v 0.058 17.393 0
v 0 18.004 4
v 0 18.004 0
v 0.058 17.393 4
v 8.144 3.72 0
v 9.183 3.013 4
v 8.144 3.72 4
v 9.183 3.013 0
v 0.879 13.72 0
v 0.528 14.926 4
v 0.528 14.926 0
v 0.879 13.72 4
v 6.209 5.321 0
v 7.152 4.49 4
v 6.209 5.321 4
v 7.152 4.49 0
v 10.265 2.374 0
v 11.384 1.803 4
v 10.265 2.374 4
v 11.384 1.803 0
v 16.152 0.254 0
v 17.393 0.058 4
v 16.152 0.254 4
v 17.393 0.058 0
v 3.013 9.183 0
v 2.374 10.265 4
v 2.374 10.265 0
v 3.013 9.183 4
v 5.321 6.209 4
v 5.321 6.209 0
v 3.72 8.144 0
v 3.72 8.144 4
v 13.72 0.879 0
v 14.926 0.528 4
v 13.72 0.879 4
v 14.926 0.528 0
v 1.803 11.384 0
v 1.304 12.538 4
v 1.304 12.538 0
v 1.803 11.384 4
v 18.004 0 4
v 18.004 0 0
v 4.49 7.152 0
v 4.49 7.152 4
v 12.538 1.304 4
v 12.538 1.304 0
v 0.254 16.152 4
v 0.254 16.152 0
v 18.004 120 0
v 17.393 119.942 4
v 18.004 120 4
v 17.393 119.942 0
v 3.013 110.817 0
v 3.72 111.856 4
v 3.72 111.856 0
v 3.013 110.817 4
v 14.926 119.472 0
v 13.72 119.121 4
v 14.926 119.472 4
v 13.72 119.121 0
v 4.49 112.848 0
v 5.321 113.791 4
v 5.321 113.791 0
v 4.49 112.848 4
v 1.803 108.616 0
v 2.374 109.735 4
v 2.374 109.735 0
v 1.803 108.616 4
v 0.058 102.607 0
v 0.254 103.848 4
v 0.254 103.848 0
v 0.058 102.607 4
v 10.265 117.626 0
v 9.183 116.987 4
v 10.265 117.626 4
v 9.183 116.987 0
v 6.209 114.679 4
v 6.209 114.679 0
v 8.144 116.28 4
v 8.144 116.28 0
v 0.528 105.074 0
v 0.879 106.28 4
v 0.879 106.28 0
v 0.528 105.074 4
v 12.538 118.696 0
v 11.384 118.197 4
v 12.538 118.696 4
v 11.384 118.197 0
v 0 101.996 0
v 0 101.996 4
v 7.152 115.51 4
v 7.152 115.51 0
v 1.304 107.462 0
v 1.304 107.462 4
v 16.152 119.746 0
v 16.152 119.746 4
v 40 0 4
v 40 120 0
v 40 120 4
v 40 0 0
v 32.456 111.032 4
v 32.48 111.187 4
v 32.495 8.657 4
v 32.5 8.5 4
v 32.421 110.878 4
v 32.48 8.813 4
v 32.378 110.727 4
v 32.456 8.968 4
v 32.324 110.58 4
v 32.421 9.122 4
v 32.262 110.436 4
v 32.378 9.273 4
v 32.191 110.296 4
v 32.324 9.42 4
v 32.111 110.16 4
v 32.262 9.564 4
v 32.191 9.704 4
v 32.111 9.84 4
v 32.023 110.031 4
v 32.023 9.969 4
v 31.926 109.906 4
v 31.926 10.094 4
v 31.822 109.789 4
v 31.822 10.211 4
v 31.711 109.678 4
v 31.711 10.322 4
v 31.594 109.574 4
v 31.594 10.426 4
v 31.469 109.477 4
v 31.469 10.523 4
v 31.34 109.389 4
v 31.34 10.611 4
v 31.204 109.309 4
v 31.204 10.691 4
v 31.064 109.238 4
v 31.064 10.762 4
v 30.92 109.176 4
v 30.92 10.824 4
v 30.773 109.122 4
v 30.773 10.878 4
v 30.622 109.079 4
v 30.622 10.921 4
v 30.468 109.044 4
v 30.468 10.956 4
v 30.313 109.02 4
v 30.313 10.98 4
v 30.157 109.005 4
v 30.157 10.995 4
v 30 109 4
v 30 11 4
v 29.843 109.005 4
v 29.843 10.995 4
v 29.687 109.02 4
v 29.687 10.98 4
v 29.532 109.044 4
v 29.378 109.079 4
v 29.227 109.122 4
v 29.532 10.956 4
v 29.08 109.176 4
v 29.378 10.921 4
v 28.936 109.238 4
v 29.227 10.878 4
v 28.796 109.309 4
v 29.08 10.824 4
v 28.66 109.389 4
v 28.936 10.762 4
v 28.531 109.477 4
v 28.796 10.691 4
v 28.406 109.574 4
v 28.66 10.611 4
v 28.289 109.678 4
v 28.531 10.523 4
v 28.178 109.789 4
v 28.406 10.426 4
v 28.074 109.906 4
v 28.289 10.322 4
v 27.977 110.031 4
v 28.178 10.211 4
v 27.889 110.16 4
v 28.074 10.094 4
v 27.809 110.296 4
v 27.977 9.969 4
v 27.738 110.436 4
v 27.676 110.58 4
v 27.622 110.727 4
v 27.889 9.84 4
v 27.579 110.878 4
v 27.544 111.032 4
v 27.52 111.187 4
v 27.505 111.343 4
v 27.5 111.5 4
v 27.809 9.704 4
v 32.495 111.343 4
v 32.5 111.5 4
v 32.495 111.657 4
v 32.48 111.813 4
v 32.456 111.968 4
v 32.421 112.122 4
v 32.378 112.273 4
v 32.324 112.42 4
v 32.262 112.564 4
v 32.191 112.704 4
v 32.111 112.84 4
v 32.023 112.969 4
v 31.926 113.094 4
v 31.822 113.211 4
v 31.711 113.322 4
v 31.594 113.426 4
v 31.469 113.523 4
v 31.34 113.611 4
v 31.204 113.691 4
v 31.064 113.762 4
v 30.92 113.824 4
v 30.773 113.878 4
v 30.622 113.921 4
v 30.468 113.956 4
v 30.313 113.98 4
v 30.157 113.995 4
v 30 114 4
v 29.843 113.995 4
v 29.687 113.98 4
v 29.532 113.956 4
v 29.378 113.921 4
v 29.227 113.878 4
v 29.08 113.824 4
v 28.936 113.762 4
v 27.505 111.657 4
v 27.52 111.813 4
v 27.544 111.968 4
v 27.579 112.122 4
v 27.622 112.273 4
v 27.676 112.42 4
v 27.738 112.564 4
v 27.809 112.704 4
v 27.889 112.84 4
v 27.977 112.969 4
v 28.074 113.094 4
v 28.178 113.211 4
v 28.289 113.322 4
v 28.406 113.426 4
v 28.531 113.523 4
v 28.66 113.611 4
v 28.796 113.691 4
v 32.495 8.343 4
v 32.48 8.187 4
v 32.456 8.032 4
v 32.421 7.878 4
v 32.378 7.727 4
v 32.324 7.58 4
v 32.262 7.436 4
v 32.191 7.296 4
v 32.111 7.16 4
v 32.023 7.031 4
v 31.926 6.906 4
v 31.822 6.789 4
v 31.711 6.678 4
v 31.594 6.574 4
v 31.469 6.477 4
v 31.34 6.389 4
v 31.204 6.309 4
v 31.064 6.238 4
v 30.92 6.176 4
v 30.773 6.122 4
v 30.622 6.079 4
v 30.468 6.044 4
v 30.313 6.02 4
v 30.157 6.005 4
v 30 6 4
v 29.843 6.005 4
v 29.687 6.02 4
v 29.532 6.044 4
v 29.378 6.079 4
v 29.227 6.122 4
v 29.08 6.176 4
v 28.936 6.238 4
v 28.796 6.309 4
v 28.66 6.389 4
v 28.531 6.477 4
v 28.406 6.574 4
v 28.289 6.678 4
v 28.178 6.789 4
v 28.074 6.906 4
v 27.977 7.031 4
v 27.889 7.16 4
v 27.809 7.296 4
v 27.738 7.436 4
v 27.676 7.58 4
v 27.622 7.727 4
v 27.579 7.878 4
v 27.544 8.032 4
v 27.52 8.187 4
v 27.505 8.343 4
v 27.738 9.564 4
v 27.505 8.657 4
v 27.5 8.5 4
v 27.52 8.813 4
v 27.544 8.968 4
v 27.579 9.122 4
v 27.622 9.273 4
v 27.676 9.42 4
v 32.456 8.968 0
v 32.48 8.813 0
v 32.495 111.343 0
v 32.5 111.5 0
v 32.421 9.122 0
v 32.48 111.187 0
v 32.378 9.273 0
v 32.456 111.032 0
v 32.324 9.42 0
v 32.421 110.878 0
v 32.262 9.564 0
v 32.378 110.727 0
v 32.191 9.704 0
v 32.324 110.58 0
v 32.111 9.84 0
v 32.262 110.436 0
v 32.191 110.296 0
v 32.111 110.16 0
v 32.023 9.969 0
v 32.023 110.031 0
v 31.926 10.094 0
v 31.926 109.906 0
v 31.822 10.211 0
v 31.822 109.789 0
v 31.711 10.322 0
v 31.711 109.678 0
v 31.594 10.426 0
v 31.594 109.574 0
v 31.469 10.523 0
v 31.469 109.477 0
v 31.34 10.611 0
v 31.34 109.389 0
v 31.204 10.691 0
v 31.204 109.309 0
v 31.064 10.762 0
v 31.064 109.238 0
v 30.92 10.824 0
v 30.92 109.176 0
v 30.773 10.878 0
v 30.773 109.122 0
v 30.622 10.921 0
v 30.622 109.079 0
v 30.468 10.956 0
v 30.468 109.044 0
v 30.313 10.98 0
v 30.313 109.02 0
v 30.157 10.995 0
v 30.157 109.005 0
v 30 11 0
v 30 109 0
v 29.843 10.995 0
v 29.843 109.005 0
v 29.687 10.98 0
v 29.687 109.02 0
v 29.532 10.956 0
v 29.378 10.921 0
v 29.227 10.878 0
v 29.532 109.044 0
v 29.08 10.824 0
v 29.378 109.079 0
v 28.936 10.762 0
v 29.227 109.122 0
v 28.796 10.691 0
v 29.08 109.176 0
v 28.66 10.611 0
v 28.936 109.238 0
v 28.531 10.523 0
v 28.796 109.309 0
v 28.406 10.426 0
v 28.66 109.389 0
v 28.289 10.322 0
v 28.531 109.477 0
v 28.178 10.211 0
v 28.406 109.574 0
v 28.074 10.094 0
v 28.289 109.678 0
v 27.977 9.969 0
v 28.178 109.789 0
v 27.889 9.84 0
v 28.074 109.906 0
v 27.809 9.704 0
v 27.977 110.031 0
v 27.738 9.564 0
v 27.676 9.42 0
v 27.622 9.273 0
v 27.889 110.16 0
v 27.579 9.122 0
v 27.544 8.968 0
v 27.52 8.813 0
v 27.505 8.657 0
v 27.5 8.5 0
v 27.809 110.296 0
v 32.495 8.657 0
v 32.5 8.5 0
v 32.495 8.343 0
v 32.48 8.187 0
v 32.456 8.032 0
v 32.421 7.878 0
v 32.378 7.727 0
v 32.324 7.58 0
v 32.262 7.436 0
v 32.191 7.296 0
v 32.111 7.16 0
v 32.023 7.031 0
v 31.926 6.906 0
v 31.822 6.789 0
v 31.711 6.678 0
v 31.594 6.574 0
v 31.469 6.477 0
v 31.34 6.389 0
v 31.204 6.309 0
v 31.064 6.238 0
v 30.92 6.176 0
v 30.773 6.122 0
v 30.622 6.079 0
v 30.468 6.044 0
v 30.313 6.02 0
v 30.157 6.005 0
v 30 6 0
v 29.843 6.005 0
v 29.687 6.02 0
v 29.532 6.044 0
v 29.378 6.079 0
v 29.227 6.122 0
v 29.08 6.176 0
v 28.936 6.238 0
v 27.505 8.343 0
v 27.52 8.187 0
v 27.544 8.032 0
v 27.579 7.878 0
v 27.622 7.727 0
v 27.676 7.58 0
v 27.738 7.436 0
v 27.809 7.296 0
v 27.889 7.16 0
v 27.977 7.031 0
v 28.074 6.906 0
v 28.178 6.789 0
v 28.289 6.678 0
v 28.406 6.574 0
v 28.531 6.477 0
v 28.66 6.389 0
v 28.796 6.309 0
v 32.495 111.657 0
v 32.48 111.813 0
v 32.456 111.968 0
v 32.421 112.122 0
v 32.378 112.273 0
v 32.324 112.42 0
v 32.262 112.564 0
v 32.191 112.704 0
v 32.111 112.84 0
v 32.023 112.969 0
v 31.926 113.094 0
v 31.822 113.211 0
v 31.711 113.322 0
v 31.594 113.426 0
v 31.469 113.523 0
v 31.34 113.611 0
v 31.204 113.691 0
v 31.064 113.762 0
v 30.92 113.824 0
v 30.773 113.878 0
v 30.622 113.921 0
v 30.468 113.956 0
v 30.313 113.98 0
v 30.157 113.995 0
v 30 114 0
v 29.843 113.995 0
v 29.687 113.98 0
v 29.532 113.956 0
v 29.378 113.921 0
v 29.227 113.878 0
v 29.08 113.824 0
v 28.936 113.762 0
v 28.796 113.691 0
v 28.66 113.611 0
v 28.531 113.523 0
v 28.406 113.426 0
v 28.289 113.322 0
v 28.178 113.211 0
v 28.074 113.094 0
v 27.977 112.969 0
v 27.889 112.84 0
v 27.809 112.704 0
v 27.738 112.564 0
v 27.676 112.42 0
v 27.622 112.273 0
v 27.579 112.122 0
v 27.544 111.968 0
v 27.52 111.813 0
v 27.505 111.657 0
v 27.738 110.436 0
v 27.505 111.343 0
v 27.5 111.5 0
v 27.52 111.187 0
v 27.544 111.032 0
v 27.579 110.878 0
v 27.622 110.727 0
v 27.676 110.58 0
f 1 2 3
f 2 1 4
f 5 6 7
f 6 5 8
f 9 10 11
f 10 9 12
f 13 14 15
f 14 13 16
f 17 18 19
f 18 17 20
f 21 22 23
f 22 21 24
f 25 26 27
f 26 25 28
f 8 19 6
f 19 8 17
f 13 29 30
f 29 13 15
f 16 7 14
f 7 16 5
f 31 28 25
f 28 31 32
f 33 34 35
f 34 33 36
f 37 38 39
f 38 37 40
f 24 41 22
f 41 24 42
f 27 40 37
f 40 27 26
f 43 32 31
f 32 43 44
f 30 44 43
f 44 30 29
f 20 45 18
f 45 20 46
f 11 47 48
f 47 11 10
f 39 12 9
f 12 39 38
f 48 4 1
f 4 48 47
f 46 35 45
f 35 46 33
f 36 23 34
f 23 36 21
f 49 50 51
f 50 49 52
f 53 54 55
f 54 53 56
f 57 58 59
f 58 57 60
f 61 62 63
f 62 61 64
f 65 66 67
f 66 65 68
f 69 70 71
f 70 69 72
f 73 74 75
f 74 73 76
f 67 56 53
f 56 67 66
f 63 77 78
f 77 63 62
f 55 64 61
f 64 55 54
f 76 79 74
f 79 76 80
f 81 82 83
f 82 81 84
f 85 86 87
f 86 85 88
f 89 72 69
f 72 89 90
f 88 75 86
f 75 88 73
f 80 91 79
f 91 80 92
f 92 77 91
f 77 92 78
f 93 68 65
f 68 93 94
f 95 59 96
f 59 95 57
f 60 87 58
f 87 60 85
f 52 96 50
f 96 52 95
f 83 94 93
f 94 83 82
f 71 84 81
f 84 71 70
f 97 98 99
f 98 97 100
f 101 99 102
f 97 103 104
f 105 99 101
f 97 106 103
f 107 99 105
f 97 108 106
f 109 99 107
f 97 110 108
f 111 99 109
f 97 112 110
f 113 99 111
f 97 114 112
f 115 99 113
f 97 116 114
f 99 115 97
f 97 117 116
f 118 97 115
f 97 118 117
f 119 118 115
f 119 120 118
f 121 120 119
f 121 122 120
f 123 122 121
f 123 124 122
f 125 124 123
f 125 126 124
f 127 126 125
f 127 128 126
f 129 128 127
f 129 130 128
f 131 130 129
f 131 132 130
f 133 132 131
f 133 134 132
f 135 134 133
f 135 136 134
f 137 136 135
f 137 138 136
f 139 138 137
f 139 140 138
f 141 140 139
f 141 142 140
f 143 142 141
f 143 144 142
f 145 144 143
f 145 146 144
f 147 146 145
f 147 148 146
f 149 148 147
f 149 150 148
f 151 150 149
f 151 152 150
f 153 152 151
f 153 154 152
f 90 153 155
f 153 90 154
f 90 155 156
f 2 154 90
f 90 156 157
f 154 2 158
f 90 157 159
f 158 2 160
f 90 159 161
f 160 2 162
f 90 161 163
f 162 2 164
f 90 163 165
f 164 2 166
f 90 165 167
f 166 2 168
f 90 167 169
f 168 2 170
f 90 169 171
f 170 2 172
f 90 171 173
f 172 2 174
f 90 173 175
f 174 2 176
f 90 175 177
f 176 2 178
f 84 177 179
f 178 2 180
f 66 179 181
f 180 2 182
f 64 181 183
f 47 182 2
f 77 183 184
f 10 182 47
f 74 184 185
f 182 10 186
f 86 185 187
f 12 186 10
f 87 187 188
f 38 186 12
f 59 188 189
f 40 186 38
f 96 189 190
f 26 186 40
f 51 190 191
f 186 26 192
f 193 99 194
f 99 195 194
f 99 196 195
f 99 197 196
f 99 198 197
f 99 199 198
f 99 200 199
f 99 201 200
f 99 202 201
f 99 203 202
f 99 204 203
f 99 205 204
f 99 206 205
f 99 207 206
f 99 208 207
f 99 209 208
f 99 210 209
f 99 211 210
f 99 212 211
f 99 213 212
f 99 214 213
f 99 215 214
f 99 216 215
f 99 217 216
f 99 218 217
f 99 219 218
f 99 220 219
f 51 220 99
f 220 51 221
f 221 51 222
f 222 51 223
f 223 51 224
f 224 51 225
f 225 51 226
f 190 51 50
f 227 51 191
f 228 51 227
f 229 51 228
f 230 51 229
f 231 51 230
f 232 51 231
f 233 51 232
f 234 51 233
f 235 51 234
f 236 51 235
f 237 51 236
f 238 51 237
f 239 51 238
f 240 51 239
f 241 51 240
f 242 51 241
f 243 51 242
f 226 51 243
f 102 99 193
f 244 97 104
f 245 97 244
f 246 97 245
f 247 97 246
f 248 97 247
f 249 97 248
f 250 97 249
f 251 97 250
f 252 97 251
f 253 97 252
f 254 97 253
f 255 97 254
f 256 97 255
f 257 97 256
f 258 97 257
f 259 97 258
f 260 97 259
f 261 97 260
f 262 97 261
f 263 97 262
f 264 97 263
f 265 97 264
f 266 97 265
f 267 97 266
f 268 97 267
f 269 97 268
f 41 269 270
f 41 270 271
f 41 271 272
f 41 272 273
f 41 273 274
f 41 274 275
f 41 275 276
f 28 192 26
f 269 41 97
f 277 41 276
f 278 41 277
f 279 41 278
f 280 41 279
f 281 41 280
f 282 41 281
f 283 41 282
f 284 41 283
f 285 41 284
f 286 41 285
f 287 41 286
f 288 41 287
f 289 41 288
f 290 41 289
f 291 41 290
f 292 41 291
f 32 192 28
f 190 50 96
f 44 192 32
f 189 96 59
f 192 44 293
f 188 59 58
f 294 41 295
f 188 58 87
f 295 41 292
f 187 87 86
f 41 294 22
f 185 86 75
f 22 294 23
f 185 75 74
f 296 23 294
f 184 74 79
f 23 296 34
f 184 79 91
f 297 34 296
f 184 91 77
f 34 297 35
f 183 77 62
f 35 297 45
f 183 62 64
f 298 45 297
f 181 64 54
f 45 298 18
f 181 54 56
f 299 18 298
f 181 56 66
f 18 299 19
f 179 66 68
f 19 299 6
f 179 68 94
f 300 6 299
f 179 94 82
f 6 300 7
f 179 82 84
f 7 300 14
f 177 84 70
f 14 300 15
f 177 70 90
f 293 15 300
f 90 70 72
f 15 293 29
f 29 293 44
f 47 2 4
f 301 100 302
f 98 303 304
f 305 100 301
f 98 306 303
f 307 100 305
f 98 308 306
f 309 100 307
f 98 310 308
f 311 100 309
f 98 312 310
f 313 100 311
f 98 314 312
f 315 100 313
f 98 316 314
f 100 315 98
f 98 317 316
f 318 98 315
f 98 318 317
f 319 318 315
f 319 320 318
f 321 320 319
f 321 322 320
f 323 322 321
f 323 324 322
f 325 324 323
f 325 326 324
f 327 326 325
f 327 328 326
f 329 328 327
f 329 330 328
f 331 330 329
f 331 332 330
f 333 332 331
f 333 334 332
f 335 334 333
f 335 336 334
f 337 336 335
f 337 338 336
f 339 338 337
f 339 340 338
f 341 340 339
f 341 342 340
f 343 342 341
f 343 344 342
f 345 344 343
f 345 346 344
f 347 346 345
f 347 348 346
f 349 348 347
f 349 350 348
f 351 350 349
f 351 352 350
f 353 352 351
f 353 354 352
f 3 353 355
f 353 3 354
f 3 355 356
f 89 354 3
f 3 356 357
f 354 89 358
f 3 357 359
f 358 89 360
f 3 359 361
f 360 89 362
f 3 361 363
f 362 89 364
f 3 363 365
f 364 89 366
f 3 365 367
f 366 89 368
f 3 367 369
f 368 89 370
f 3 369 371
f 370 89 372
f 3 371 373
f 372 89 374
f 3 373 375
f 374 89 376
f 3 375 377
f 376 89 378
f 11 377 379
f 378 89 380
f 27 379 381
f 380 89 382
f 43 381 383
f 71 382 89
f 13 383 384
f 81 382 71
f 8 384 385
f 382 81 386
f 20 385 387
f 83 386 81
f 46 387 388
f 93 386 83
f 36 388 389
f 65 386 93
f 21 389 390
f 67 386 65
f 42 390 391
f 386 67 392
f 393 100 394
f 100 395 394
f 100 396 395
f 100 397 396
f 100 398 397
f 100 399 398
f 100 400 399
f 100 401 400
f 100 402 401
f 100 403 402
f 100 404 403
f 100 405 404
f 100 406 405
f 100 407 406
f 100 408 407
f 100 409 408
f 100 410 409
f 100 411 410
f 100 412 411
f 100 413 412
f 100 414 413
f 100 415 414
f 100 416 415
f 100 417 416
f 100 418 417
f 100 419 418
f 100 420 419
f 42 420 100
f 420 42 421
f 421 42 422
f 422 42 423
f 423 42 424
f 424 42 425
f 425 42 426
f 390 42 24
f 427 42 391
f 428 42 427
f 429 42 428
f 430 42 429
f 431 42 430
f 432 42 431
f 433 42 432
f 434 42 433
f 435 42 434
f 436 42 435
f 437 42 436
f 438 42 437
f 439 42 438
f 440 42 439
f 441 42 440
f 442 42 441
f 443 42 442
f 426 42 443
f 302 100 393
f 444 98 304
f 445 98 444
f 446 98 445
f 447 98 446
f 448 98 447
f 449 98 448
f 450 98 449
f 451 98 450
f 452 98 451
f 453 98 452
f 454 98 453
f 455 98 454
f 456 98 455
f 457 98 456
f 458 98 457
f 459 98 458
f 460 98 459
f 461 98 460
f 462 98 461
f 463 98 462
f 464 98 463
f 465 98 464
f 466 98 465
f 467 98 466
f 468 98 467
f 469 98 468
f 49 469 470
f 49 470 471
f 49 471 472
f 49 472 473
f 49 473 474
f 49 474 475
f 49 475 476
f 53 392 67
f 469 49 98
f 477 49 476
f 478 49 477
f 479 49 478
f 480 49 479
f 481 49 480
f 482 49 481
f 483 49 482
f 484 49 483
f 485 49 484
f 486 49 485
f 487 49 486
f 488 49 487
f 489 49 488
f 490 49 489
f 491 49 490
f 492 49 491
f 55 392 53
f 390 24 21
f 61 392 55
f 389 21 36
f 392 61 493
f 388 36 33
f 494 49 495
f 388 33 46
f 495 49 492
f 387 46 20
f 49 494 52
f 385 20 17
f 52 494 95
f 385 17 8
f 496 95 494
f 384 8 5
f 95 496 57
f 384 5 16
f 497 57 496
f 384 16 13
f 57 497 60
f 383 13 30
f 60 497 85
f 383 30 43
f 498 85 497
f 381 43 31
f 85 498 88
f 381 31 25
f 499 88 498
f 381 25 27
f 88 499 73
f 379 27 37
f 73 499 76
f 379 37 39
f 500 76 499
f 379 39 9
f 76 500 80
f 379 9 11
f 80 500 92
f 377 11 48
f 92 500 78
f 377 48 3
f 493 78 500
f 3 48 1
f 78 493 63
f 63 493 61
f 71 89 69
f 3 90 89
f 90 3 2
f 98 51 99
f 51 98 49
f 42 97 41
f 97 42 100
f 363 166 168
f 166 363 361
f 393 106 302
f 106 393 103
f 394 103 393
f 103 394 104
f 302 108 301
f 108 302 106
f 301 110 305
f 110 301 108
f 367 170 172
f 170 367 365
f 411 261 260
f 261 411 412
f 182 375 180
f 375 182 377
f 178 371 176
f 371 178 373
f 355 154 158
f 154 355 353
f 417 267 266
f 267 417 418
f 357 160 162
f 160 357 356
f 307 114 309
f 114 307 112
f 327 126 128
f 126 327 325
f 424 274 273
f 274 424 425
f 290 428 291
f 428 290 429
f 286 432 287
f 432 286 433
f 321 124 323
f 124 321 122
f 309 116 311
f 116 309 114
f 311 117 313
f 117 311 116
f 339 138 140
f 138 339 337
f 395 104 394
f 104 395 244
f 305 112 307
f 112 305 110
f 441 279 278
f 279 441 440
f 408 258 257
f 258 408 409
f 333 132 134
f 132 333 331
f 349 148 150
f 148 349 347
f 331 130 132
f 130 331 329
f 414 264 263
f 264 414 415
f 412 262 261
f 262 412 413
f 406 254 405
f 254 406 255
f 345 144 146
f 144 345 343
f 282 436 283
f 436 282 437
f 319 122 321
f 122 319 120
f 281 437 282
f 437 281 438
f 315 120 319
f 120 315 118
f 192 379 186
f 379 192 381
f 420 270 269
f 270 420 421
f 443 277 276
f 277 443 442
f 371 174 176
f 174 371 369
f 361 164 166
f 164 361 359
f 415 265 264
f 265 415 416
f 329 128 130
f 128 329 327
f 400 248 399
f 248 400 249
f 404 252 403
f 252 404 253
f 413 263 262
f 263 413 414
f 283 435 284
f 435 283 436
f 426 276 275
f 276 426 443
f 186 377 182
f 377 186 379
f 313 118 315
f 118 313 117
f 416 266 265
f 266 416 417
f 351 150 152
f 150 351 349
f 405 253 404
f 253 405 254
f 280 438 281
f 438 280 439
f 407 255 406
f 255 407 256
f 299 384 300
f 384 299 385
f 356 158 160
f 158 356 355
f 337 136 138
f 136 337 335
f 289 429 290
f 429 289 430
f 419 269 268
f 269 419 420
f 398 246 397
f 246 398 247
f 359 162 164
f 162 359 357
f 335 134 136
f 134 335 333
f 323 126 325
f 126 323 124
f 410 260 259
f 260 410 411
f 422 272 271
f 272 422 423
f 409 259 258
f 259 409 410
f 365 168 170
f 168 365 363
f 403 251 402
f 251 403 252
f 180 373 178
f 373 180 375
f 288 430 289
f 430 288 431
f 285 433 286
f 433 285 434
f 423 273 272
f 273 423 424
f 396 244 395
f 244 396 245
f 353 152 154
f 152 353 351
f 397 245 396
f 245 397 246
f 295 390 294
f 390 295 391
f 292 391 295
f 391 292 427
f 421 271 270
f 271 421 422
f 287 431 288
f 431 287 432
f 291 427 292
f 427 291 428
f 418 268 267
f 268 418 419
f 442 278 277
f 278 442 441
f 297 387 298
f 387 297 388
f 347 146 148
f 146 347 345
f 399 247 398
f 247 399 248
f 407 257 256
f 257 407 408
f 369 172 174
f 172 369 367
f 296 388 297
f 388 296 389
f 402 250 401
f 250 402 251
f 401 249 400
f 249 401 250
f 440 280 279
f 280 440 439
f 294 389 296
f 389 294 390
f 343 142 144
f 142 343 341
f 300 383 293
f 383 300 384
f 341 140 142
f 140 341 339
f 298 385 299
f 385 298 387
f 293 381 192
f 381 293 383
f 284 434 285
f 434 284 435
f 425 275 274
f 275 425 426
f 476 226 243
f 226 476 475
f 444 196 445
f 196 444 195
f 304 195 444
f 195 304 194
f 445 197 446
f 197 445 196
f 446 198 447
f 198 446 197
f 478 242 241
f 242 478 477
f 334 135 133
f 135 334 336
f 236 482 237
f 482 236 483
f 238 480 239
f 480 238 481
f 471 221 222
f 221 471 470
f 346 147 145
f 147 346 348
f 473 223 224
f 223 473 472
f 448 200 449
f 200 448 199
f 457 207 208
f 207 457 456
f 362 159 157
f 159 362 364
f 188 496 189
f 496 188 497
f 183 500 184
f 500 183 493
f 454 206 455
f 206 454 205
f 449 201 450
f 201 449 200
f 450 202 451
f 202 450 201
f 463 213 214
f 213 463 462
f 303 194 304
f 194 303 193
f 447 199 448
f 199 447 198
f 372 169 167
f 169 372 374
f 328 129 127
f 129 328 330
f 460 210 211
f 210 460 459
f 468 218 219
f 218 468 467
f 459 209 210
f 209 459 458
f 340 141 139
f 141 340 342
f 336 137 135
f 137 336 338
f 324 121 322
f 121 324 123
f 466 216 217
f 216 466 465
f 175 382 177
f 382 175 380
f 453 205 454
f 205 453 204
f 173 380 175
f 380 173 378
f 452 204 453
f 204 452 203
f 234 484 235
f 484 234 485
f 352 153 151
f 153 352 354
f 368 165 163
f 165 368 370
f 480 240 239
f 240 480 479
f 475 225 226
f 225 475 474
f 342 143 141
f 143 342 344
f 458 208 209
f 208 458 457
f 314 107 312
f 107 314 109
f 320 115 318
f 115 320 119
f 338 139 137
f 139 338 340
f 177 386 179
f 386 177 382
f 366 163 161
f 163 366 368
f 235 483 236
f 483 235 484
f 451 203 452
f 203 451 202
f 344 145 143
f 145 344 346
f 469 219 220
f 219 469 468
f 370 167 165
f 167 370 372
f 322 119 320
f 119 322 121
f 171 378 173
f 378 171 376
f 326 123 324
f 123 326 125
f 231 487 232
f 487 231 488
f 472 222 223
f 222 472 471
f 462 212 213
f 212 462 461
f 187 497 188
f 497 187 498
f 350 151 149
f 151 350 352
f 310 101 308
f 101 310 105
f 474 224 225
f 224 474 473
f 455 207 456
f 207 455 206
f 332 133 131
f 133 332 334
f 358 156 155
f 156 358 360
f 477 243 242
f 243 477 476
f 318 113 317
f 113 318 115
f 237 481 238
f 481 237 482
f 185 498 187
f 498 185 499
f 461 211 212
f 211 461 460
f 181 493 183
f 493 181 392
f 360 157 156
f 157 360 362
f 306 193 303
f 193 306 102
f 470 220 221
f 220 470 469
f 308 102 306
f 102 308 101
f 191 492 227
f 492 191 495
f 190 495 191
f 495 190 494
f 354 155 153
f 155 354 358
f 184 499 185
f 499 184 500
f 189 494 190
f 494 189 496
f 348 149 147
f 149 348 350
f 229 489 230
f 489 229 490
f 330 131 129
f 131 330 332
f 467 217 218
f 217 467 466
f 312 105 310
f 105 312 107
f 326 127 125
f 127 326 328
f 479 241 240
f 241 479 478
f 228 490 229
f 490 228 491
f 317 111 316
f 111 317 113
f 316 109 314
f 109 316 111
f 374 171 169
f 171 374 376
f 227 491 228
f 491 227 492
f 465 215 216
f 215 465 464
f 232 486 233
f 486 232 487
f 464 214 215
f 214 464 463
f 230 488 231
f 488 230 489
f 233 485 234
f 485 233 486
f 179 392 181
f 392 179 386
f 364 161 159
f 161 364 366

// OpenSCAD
// file: functions.scad
/**********************************
	File: functions.scad
	Revision: 0.1 (10/7/2012)
	OpenSCAD version by:
	Michael Williams (gannon)
	mswillia@mtu.edu
**********************************/
include <config.scad>

//Drill a hole the given depth at the given location
module drill(x,y,radius,depth) {
	translate([x,y,-overdrill])
		cylinder(r=radius,h=depth,$fn=100);
}

module roundedcorner(radius,thickness,angle) {
	rotate([0,0,angle])
		translate([-radius+overdrill,-radius+overdrill,-overdrill])
			difference() {
				translate([-overdrill,-overdrill,0])
					cube([radius+overdrill,radius+overdrill,thickness+overdrill*2]);
				cylinder(r=radius,h=thickness+overdrill*2, $fn=100);
			}
}

//Usage: points is an array consisting of elements
//[x,y,r] for each point of the polygon
//Please note that x and y will be the centers
//of the rounded edges! Outside wall will be
//r away at some angle.
//Ideally I will make a function that will find
//the place to put the circle of a given radius
//based off of the points in the polygon.
module multiradiusroundedpoly(points,height) {
	linear_extrude(height=height)
		hull()
			for (p = points) {
				translate([p[0],p[1],0])
					circle(r=p[2],$fn=100);
			}
}
// file: config.scad
/**********************************
	File: config.scad
	Revision: 0.2 (1/5/2013)
	OpenSCAD version by:
	Michael Williams (gannon)
	mswillia@mtu.edu
**********************************/

/**********************************
		CONFIGURATION
**********************************/
//This is for the depth of holes so OpenSCAD renders correctly.
overdrill=0.1;

//LM10UU
linear_bearing_length=29;
linear_bearing_ID=10;
linear_bearing_OD=19.4;//19

//HFSB5-2020 extrusions
extrusion_height=20;
extrusion_width=20;
extrusion_wall=3.2;
extrusion_opening=5.4;

//Large rods
smooth_rod_diameter=10;
threaded_rod_diameter=8;

//608zz
skate_bearings_length=7;
skate_bearings_ID=8;
skate_bearings_OD=22;

//Belt configuration
belt_width=8;
belt_depth=1;

/*
3/8"-12 acme rod
m8 threaded rod
*/

spring_OD=6;

screw_a_diameter=3;
screw_b_diameter=4;
screw_c_diameter=5;
screw_d_diameter=8;

/**********************************
		END CONFIGURATION
**********************************/
// main file
/**********************************
	File: NamePlate.scad
	Revision: 0.3 (2/2/2012)
	OpenSCAD version by:
	Michael Williams (gannon)
	mswillia@mtu.edu
**********************************/
include <config.scad>
use <functions.scad>
/**********************************
		CONFIGURATION
**********************************/
//Base size
base=[40,120,4];
corner_radius=20;

/**********************************
		END CONFIGURATION
**********************************/
difference() {
	cube(base);
	roundedcorner(corner_radius,base[2],180);
	translate([0,base[1],0])
		roundedcorner(corner_radius,base[2],90);
	drill(30,8.5,screw_c_diameter/2,base[2]+overdrill*2);
	drill(30,base[1]-8.5,screw_c_diameter/2,base[2]+overdrill*2);
}
